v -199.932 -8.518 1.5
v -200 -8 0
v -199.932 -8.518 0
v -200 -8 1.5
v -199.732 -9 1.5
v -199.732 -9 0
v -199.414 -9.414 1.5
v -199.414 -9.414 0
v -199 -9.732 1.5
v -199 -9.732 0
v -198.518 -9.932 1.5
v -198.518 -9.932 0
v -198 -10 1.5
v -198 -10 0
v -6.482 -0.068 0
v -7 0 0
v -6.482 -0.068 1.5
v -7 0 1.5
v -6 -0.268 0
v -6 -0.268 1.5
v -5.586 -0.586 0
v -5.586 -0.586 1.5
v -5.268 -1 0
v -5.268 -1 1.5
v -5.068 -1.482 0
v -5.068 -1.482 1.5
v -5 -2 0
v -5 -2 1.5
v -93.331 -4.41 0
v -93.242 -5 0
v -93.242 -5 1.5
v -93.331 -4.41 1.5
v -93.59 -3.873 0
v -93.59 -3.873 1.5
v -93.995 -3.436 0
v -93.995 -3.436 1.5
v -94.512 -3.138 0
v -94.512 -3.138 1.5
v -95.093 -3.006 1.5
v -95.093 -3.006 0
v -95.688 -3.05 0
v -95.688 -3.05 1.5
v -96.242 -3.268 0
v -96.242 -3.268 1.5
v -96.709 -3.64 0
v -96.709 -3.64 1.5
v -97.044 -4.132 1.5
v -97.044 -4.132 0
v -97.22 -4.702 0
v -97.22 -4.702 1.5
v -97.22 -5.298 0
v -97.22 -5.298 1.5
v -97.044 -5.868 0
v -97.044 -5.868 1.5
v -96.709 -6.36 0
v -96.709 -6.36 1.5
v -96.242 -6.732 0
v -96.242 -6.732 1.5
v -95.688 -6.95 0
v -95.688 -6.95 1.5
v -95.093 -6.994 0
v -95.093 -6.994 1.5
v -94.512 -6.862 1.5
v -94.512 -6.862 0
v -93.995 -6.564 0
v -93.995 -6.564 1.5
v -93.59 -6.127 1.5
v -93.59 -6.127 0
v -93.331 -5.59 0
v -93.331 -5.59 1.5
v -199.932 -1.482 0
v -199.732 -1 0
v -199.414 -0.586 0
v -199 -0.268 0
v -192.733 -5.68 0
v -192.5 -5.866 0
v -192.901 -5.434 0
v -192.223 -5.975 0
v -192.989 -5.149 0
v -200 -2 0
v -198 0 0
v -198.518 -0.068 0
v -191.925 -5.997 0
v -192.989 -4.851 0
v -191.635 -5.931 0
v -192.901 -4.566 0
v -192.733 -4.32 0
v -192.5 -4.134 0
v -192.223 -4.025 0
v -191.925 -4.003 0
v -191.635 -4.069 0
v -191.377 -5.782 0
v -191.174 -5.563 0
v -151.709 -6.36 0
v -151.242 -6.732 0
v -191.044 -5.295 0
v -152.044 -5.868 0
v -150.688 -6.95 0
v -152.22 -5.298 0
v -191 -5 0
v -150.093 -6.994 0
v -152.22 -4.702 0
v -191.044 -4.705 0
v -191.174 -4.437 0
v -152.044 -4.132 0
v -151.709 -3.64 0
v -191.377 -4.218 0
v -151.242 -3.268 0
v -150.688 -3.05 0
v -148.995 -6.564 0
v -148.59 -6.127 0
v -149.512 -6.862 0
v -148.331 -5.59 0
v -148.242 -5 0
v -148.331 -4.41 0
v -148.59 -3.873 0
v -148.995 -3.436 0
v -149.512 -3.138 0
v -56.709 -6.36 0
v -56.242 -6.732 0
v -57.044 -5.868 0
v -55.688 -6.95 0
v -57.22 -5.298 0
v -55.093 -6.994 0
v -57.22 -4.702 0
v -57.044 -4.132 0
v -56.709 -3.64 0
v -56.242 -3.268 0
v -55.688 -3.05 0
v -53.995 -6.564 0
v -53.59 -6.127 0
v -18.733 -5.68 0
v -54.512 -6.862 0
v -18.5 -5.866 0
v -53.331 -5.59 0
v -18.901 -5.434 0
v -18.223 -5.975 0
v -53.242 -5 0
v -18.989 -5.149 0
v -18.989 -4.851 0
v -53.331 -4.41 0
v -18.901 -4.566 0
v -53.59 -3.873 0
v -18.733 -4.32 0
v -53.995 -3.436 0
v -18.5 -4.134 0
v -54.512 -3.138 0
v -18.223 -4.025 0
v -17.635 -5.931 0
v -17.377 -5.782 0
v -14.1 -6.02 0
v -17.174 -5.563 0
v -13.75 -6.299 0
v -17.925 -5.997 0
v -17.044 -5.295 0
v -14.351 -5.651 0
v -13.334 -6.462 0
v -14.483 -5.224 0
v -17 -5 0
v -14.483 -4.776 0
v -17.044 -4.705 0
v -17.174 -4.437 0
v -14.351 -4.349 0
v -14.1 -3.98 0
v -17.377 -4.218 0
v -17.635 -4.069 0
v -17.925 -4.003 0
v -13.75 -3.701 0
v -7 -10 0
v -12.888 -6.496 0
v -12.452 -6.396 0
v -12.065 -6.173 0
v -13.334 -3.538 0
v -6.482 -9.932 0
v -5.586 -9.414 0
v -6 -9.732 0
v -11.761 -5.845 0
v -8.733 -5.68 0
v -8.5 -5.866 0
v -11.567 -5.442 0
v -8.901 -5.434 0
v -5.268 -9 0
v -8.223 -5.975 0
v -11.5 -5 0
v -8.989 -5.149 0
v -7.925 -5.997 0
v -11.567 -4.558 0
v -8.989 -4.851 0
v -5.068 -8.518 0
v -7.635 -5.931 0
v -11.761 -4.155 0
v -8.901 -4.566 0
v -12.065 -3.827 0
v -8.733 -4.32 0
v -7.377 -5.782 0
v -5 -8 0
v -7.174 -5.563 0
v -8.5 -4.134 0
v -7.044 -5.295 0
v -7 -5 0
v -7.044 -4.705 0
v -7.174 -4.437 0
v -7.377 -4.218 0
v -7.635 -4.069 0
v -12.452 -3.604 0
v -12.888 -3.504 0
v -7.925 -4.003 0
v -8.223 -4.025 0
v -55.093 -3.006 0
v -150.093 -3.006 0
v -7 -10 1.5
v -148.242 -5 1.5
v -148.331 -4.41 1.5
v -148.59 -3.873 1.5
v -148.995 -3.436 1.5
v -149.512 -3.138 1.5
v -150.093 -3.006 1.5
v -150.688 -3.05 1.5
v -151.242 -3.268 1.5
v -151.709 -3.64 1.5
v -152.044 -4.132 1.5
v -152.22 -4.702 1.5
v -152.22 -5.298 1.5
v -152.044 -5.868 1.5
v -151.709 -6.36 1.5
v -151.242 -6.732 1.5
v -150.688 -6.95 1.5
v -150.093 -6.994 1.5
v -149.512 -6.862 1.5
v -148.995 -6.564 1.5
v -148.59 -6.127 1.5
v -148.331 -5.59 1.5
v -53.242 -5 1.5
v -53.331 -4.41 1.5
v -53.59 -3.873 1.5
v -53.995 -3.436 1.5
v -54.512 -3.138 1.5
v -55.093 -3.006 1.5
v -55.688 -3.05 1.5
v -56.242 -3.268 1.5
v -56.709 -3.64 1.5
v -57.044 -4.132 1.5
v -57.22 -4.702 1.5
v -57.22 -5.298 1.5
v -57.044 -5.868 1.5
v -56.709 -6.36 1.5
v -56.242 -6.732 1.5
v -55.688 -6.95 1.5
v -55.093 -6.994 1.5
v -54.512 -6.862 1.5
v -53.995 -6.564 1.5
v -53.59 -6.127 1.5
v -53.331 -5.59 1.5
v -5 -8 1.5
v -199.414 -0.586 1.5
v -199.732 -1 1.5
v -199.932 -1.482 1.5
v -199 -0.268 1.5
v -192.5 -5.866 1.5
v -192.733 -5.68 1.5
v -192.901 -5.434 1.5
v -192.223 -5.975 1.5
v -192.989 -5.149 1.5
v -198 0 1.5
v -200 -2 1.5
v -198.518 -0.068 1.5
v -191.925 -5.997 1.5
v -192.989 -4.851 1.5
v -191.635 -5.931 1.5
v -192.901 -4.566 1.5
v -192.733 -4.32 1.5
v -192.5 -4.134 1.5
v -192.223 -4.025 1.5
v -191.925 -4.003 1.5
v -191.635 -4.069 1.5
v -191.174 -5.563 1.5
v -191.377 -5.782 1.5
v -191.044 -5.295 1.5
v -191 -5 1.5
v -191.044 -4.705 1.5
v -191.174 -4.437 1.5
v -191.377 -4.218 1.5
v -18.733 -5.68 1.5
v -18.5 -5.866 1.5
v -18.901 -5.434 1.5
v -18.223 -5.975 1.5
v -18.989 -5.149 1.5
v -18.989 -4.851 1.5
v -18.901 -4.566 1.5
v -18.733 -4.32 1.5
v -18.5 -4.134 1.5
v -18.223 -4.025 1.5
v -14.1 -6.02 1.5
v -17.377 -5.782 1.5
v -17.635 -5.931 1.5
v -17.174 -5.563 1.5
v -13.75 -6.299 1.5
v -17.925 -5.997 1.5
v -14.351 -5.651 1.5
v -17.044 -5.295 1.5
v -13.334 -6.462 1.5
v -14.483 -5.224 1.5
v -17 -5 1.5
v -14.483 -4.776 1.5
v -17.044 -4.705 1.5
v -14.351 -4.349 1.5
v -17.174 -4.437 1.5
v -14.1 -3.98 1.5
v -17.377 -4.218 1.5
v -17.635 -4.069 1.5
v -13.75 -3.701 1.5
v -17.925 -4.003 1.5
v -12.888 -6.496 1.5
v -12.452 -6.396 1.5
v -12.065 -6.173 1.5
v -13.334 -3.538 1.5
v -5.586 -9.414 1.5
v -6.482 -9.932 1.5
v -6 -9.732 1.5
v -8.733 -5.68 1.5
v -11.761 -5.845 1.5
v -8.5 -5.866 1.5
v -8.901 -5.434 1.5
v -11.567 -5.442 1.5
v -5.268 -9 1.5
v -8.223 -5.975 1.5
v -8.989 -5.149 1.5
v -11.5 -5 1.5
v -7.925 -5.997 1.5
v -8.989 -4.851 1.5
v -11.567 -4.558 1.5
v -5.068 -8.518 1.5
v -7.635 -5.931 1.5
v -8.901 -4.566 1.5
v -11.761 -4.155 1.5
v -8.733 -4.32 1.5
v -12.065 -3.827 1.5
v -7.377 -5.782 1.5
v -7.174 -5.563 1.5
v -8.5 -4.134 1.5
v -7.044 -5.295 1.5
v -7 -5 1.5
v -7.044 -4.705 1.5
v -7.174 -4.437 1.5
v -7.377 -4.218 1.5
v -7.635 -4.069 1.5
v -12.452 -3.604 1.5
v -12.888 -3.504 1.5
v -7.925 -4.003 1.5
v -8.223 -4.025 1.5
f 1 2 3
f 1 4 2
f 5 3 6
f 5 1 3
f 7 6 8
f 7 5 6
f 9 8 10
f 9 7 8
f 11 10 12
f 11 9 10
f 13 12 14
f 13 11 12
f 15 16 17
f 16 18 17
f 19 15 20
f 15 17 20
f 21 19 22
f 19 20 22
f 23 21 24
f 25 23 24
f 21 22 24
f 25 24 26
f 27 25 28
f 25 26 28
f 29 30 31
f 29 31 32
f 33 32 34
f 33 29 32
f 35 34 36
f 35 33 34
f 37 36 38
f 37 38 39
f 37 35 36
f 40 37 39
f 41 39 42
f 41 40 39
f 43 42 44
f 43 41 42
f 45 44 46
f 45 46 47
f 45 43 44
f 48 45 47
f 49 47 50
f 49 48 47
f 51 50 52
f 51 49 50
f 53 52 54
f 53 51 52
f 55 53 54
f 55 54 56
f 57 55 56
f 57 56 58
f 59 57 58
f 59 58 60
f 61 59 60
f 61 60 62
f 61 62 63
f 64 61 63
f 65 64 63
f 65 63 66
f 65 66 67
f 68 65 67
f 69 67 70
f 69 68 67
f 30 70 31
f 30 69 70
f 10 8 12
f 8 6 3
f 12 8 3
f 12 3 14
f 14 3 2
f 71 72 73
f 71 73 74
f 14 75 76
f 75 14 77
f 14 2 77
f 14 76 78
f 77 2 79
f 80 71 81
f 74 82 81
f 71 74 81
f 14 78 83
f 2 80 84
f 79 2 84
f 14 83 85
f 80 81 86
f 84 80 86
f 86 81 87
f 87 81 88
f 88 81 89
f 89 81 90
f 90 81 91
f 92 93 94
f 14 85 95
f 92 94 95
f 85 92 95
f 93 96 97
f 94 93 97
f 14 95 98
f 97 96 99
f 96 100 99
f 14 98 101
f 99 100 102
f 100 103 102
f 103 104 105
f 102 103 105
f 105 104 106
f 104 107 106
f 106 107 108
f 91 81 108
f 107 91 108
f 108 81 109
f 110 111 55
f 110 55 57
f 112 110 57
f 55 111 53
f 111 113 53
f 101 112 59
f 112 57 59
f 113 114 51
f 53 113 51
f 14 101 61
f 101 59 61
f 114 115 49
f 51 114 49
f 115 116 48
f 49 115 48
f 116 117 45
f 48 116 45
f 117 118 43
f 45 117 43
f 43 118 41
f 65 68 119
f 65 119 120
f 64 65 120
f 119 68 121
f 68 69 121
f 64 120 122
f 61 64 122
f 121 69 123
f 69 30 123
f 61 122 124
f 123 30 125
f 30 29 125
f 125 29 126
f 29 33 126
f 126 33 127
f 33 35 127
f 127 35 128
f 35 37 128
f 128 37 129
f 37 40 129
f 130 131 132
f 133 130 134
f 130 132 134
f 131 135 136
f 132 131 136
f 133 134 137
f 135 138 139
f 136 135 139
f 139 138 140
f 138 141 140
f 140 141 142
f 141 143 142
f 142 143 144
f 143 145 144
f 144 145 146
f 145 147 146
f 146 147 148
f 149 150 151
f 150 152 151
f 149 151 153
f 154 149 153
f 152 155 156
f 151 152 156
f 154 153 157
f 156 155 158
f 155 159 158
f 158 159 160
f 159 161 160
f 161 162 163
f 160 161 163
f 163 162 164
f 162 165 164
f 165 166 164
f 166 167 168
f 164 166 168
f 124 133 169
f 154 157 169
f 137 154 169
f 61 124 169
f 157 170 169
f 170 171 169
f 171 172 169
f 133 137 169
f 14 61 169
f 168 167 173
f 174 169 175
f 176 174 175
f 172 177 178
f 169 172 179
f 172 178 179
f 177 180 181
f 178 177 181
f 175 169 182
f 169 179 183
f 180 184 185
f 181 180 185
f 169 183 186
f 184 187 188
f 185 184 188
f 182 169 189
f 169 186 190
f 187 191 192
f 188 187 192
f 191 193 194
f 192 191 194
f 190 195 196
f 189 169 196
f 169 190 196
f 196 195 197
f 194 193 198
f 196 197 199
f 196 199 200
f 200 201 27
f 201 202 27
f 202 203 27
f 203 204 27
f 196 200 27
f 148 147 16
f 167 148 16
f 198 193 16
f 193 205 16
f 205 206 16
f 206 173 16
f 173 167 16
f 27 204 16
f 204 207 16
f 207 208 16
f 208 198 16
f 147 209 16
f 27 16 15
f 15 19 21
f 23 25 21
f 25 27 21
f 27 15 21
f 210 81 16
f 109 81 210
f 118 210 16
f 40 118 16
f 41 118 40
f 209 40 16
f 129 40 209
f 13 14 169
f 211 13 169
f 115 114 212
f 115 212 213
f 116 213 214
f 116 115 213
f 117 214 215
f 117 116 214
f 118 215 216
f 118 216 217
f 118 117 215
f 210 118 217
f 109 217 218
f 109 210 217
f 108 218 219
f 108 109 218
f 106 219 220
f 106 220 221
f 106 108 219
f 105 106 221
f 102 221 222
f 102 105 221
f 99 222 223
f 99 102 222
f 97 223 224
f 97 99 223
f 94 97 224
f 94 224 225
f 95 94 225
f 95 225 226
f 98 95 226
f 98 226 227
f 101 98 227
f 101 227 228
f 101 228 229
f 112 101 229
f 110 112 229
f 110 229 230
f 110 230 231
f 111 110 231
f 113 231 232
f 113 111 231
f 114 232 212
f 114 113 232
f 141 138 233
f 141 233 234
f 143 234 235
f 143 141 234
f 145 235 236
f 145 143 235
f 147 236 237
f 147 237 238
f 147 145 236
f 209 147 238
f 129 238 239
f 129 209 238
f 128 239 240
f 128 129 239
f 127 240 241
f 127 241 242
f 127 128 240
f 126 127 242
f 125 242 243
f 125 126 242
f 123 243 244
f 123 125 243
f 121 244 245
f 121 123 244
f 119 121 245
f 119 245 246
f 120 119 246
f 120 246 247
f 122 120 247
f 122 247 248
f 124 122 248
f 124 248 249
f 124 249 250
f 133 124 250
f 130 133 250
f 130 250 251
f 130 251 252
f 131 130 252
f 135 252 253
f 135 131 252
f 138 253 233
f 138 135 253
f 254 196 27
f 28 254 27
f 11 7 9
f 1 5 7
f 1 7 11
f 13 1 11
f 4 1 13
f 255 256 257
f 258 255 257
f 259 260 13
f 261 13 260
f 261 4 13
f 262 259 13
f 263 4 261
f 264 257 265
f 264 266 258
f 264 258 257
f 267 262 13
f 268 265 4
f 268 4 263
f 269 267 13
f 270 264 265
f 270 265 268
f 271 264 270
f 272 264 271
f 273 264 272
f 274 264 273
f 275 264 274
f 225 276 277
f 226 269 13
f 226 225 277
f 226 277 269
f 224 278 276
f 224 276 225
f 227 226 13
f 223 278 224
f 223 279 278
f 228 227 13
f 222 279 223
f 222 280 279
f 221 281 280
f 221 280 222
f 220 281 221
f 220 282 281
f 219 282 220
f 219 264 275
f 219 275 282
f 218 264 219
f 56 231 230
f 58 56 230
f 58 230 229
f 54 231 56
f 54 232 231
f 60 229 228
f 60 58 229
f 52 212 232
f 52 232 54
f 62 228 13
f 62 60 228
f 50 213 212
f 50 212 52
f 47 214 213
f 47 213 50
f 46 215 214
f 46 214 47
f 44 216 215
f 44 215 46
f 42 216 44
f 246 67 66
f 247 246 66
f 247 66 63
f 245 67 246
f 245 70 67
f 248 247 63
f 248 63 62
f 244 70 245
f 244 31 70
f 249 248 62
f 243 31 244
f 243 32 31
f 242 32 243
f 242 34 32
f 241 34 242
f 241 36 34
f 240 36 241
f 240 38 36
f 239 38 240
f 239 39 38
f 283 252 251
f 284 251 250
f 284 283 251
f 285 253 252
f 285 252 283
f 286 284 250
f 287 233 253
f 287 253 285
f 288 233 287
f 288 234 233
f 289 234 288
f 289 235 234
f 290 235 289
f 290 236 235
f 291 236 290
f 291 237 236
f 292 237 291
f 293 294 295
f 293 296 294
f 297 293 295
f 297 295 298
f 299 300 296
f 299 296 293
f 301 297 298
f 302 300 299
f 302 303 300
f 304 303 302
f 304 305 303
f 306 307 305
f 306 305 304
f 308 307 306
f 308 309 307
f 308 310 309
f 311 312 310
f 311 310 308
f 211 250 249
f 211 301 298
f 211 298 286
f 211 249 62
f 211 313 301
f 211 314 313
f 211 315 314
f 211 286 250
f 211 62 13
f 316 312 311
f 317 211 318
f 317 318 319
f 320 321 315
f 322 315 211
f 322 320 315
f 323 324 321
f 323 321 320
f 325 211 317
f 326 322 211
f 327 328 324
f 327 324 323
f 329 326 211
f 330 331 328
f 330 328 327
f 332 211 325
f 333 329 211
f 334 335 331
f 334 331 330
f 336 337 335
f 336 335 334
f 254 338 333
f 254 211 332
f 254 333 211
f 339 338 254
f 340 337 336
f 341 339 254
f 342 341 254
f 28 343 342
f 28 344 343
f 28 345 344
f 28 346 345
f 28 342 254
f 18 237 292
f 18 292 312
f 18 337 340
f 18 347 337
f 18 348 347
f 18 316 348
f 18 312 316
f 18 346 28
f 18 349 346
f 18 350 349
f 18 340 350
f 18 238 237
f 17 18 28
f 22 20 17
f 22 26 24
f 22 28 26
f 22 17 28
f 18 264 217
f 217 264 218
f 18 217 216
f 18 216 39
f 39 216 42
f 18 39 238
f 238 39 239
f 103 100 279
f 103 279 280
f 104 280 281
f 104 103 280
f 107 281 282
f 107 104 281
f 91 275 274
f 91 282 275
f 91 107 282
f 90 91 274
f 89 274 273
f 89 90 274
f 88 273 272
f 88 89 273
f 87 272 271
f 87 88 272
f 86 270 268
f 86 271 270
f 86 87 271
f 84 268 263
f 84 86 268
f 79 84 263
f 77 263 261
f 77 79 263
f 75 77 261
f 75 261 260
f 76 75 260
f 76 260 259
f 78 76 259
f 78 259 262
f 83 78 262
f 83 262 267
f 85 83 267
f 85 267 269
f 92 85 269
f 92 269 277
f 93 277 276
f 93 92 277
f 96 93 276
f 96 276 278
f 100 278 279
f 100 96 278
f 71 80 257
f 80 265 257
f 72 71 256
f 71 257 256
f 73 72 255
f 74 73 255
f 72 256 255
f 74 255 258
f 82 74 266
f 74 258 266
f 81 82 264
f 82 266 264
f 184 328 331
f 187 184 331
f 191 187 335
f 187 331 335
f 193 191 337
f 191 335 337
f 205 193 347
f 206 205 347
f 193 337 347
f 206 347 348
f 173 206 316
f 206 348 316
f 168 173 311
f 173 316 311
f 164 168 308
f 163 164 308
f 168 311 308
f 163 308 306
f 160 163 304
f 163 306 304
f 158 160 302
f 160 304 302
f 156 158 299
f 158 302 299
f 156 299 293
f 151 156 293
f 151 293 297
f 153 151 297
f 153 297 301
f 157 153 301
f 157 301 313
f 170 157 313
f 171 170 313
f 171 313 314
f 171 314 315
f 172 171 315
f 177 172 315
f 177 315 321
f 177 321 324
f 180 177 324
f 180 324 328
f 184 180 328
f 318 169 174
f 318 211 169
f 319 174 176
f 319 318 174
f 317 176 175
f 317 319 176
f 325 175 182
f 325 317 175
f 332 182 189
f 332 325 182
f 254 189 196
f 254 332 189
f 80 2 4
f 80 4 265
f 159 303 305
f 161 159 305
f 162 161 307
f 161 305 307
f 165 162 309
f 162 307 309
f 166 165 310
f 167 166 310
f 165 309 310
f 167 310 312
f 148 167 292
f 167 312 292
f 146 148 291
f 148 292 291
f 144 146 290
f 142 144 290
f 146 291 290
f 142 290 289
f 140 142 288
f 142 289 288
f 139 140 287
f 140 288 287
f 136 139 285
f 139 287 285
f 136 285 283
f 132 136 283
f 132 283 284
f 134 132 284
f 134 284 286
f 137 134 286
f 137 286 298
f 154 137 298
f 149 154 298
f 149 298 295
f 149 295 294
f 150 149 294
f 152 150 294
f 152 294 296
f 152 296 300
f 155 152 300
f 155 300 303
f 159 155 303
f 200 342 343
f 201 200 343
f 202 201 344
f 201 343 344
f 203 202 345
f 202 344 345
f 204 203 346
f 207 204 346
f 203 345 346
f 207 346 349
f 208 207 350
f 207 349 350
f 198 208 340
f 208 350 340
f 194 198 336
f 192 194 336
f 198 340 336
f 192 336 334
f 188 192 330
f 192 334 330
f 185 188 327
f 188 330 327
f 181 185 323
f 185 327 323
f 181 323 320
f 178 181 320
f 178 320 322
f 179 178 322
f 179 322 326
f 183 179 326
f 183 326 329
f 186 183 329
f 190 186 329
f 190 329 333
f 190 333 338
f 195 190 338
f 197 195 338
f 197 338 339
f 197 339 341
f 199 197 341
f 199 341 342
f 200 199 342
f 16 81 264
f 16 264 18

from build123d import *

# Parameters (mm, degrees)
SKETCH_1_W               = 195
SKETCH_1_H               = 10
SKETCH_1_R               = 2
EXTRUDE_1_DEPTH          = 1.5
CUT_EXTRUDE_1_DEPTH      = 12
CUT_EXTRUDE_1_DEPTH_BACK = 15
SKETCH_2_R               = 1
SKETCH_3_R               = 1
SKETCH_3_R_2             = 1.5
CUT_EXTRUDE_2_DEPTH      = 10
FILLET_1_R               = 2


with BuildPart() as part:
    # 草图1 → 凸台-拉伸1 (new body)
    with BuildSketch(Plane.XY):
        with Locations((-102.5, -5)):
            Rectangle(SKETCH_1_W, SKETCH_1_H)
        with Locations((-55.242474917, -5.000000002)):
            Circle(SKETCH_1_R, mode=Mode.SUBTRACT)
        with Locations((-95.242474917, -5.000000002)):
            Circle(SKETCH_1_R, mode=Mode.SUBTRACT)
        with Locations((-150.242474917, -5.000000002)):
            Circle(SKETCH_1_R, mode=Mode.SUBTRACT)
    extrude(amount=EXTRUDE_1_DEPTH)

    # 草图2 → 切除-拉伸1 (cut, two sides: drawn at the far end of the back side and taken through both)
    with BuildSketch(Plane.XY.offset(1.5).offset(-CUT_EXTRUDE_1_DEPTH_BACK)):
        with Locations((-192, -5)):
            Circle(SKETCH_2_R)
    extrude(amount=CUT_EXTRUDE_1_DEPTH + CUT_EXTRUDE_1_DEPTH_BACK, mode=Mode.SUBTRACT)

    # 草图3 → 切除-拉伸2 (cut)
    with BuildSketch(Plane.XY.offset(1.5)):
        with Locations((-8, -5)):
            Circle(SKETCH_3_R)
        with Locations((-13, -5)):
            Circle(SKETCH_3_R_2)
        with Locations((-18, -5)):
            Circle(SKETCH_3_R)
    extrude(amount=-CUT_EXTRUDE_2_DEPTH, mode=Mode.SUBTRACT)

    # 圆角1
    fillet_1_edges = [part.edges().sort_by_distance(p)[0] for p in [
        (-200, 0, 0.75),
        (-5, 0, 0.75),
        (-5, -10, 0.75),
        (-200, -10, 0.75),
    ]]
    fillet(fillet_1_edges, radius=FILLET_1_R)


solid = part.part
